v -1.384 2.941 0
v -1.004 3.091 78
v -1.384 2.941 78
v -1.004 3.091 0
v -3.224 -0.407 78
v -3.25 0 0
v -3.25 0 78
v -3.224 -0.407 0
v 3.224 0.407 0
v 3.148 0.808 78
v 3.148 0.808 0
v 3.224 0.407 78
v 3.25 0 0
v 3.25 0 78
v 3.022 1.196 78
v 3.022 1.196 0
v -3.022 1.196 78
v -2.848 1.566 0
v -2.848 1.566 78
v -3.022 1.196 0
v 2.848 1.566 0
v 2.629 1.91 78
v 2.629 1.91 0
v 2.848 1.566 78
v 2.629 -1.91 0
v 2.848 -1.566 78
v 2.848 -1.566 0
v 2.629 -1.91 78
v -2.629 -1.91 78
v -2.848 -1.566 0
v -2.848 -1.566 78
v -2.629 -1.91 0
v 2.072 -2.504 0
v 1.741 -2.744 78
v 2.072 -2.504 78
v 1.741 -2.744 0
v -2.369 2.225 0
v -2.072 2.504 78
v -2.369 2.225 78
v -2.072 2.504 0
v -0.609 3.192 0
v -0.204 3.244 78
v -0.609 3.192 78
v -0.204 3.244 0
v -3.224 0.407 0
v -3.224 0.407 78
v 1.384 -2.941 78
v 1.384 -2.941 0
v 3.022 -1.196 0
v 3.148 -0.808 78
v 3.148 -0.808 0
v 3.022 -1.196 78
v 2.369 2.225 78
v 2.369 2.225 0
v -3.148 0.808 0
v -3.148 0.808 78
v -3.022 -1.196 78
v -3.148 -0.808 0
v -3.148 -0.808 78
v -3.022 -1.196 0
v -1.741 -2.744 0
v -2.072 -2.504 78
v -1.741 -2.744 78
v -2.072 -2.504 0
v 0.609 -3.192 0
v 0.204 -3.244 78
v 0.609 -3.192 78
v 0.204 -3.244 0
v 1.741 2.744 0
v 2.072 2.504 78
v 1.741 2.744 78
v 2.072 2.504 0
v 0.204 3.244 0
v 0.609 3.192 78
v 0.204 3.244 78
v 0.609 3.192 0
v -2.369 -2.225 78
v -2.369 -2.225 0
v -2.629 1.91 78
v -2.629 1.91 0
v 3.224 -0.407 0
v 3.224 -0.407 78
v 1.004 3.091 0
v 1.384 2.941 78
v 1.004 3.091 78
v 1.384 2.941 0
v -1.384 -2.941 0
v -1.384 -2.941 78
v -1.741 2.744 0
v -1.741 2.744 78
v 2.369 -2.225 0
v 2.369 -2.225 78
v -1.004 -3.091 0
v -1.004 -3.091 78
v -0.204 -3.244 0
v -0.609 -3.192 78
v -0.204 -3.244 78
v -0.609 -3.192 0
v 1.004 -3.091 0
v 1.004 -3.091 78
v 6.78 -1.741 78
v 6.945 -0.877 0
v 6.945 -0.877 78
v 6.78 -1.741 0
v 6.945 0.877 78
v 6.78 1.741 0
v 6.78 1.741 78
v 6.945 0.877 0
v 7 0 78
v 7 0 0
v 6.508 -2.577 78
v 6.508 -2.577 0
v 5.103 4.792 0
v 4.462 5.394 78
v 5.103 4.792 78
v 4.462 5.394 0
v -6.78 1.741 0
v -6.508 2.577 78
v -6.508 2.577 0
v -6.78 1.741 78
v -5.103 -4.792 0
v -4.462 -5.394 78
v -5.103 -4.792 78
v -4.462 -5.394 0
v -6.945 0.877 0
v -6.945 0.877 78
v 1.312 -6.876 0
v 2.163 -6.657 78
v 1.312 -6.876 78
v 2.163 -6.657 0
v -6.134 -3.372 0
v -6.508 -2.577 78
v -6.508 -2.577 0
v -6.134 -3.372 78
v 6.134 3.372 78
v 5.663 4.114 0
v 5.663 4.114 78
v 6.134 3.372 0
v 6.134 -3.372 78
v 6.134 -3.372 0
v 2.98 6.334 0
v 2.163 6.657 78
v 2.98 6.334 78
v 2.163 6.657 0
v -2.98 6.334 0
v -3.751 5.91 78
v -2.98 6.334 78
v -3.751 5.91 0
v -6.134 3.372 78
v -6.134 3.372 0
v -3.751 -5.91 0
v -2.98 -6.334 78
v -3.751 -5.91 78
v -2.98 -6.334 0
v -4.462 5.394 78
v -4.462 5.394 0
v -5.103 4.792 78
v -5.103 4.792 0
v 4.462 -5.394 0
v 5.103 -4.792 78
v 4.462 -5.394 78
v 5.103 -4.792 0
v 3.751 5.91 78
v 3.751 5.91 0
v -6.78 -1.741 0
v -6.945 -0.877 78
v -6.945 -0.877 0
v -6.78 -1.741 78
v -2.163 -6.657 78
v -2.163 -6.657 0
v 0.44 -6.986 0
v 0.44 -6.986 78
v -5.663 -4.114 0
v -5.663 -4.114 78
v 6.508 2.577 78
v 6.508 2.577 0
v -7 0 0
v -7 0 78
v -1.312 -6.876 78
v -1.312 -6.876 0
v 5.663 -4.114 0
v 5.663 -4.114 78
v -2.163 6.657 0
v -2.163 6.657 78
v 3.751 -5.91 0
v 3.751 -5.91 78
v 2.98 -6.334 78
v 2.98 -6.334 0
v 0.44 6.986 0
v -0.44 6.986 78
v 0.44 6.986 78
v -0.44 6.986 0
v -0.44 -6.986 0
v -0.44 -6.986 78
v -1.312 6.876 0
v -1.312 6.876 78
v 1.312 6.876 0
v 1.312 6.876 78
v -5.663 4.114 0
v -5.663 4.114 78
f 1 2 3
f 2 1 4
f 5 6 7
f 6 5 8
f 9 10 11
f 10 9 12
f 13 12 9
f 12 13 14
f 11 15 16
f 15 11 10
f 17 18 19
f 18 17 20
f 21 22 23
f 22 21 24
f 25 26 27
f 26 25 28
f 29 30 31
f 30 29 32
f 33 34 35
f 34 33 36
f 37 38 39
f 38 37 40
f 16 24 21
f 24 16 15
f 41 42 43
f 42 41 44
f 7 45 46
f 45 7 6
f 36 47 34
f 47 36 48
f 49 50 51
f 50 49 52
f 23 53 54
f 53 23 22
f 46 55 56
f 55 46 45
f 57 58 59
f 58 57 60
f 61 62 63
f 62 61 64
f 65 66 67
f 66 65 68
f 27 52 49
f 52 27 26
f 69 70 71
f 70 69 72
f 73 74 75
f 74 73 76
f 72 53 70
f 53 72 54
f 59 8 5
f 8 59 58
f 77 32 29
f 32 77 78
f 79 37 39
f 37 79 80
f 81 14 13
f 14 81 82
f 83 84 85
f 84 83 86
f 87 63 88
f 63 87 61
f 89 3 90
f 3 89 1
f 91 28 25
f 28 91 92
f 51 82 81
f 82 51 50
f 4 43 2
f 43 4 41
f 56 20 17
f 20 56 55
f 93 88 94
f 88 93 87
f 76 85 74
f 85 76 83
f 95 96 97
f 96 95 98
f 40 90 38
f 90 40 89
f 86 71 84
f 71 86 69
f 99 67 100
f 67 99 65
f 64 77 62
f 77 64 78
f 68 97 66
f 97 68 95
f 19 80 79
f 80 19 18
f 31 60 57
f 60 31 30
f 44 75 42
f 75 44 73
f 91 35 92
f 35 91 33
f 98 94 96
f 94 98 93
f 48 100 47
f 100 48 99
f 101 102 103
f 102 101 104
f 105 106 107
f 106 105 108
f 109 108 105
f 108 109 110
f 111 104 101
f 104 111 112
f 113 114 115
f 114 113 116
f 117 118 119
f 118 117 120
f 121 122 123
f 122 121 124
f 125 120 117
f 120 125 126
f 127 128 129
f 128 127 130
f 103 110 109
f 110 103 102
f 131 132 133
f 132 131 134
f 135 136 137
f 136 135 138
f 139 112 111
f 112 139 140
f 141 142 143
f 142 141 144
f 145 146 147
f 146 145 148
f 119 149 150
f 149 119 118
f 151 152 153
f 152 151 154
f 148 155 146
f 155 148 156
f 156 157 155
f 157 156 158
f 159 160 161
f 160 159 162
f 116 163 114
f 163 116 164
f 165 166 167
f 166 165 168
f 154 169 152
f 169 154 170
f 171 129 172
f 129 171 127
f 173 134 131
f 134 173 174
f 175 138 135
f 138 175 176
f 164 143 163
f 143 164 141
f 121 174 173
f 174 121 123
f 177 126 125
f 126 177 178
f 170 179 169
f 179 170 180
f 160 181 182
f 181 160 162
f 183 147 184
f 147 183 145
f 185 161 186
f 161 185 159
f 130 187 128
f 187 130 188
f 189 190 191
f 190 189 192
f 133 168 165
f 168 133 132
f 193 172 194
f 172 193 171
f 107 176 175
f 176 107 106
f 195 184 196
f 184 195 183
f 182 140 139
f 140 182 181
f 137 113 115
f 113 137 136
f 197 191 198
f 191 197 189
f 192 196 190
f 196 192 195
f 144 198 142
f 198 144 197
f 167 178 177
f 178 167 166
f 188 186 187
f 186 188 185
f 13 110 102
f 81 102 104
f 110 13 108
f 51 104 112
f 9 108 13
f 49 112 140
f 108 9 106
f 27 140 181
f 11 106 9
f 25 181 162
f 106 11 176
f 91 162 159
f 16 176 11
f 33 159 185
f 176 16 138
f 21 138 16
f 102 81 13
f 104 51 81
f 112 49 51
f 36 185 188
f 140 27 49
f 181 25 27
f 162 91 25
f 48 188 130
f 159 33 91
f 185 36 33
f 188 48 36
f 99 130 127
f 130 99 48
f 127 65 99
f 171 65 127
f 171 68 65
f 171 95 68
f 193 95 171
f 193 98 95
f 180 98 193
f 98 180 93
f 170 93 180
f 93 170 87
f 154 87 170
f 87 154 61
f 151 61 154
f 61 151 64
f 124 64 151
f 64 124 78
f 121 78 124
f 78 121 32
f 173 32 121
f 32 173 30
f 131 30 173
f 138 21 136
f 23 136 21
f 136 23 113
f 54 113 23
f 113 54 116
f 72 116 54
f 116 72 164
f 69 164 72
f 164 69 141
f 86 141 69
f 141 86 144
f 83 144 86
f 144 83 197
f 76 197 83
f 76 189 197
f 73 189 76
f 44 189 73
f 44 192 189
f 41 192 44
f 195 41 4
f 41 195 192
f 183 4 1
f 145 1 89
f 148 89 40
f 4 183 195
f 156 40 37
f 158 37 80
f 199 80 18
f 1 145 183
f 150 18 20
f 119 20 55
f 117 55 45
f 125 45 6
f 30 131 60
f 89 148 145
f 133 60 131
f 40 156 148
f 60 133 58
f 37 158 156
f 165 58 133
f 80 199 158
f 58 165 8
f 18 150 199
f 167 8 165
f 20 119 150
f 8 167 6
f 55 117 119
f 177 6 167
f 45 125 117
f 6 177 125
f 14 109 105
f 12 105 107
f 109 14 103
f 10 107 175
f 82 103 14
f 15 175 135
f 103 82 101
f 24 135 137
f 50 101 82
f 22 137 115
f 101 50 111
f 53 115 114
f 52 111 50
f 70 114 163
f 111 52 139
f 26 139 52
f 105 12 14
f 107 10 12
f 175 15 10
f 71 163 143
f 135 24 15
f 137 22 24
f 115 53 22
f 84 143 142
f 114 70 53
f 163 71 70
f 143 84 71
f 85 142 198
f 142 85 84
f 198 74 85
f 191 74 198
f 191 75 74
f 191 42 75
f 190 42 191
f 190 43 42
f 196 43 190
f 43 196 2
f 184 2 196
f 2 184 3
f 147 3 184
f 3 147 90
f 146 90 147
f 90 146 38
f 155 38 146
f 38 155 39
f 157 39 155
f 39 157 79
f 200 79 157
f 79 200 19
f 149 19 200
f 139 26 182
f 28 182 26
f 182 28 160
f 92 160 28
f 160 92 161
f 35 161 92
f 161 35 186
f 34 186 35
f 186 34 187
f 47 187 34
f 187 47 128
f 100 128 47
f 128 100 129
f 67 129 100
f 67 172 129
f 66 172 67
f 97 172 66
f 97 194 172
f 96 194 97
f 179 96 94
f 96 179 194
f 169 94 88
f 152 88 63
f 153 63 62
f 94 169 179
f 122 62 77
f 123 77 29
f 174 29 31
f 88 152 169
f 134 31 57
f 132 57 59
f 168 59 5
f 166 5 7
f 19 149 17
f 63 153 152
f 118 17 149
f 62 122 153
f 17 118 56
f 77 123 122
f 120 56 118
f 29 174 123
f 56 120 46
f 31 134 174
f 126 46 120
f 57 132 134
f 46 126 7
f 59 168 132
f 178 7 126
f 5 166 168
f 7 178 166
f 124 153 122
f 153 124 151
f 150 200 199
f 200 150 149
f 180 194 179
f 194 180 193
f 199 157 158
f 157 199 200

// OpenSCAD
$fn = 50;


difference() {
	union() {
		cylinder(h = 78, r = 7.0000000000);
	}
	union() {
		translate(v = [0.0000000000, 0.0000000000, -100.0000000000]) {
			cylinder(h = 200, r = 3.2500000000);
		}
		cylinder(h = 78, r = 1.8000000000);
		cylinder(h = 78, r = 1.8000000000);
		cylinder(h = 78, r = 1.8000000000);
	}
}
